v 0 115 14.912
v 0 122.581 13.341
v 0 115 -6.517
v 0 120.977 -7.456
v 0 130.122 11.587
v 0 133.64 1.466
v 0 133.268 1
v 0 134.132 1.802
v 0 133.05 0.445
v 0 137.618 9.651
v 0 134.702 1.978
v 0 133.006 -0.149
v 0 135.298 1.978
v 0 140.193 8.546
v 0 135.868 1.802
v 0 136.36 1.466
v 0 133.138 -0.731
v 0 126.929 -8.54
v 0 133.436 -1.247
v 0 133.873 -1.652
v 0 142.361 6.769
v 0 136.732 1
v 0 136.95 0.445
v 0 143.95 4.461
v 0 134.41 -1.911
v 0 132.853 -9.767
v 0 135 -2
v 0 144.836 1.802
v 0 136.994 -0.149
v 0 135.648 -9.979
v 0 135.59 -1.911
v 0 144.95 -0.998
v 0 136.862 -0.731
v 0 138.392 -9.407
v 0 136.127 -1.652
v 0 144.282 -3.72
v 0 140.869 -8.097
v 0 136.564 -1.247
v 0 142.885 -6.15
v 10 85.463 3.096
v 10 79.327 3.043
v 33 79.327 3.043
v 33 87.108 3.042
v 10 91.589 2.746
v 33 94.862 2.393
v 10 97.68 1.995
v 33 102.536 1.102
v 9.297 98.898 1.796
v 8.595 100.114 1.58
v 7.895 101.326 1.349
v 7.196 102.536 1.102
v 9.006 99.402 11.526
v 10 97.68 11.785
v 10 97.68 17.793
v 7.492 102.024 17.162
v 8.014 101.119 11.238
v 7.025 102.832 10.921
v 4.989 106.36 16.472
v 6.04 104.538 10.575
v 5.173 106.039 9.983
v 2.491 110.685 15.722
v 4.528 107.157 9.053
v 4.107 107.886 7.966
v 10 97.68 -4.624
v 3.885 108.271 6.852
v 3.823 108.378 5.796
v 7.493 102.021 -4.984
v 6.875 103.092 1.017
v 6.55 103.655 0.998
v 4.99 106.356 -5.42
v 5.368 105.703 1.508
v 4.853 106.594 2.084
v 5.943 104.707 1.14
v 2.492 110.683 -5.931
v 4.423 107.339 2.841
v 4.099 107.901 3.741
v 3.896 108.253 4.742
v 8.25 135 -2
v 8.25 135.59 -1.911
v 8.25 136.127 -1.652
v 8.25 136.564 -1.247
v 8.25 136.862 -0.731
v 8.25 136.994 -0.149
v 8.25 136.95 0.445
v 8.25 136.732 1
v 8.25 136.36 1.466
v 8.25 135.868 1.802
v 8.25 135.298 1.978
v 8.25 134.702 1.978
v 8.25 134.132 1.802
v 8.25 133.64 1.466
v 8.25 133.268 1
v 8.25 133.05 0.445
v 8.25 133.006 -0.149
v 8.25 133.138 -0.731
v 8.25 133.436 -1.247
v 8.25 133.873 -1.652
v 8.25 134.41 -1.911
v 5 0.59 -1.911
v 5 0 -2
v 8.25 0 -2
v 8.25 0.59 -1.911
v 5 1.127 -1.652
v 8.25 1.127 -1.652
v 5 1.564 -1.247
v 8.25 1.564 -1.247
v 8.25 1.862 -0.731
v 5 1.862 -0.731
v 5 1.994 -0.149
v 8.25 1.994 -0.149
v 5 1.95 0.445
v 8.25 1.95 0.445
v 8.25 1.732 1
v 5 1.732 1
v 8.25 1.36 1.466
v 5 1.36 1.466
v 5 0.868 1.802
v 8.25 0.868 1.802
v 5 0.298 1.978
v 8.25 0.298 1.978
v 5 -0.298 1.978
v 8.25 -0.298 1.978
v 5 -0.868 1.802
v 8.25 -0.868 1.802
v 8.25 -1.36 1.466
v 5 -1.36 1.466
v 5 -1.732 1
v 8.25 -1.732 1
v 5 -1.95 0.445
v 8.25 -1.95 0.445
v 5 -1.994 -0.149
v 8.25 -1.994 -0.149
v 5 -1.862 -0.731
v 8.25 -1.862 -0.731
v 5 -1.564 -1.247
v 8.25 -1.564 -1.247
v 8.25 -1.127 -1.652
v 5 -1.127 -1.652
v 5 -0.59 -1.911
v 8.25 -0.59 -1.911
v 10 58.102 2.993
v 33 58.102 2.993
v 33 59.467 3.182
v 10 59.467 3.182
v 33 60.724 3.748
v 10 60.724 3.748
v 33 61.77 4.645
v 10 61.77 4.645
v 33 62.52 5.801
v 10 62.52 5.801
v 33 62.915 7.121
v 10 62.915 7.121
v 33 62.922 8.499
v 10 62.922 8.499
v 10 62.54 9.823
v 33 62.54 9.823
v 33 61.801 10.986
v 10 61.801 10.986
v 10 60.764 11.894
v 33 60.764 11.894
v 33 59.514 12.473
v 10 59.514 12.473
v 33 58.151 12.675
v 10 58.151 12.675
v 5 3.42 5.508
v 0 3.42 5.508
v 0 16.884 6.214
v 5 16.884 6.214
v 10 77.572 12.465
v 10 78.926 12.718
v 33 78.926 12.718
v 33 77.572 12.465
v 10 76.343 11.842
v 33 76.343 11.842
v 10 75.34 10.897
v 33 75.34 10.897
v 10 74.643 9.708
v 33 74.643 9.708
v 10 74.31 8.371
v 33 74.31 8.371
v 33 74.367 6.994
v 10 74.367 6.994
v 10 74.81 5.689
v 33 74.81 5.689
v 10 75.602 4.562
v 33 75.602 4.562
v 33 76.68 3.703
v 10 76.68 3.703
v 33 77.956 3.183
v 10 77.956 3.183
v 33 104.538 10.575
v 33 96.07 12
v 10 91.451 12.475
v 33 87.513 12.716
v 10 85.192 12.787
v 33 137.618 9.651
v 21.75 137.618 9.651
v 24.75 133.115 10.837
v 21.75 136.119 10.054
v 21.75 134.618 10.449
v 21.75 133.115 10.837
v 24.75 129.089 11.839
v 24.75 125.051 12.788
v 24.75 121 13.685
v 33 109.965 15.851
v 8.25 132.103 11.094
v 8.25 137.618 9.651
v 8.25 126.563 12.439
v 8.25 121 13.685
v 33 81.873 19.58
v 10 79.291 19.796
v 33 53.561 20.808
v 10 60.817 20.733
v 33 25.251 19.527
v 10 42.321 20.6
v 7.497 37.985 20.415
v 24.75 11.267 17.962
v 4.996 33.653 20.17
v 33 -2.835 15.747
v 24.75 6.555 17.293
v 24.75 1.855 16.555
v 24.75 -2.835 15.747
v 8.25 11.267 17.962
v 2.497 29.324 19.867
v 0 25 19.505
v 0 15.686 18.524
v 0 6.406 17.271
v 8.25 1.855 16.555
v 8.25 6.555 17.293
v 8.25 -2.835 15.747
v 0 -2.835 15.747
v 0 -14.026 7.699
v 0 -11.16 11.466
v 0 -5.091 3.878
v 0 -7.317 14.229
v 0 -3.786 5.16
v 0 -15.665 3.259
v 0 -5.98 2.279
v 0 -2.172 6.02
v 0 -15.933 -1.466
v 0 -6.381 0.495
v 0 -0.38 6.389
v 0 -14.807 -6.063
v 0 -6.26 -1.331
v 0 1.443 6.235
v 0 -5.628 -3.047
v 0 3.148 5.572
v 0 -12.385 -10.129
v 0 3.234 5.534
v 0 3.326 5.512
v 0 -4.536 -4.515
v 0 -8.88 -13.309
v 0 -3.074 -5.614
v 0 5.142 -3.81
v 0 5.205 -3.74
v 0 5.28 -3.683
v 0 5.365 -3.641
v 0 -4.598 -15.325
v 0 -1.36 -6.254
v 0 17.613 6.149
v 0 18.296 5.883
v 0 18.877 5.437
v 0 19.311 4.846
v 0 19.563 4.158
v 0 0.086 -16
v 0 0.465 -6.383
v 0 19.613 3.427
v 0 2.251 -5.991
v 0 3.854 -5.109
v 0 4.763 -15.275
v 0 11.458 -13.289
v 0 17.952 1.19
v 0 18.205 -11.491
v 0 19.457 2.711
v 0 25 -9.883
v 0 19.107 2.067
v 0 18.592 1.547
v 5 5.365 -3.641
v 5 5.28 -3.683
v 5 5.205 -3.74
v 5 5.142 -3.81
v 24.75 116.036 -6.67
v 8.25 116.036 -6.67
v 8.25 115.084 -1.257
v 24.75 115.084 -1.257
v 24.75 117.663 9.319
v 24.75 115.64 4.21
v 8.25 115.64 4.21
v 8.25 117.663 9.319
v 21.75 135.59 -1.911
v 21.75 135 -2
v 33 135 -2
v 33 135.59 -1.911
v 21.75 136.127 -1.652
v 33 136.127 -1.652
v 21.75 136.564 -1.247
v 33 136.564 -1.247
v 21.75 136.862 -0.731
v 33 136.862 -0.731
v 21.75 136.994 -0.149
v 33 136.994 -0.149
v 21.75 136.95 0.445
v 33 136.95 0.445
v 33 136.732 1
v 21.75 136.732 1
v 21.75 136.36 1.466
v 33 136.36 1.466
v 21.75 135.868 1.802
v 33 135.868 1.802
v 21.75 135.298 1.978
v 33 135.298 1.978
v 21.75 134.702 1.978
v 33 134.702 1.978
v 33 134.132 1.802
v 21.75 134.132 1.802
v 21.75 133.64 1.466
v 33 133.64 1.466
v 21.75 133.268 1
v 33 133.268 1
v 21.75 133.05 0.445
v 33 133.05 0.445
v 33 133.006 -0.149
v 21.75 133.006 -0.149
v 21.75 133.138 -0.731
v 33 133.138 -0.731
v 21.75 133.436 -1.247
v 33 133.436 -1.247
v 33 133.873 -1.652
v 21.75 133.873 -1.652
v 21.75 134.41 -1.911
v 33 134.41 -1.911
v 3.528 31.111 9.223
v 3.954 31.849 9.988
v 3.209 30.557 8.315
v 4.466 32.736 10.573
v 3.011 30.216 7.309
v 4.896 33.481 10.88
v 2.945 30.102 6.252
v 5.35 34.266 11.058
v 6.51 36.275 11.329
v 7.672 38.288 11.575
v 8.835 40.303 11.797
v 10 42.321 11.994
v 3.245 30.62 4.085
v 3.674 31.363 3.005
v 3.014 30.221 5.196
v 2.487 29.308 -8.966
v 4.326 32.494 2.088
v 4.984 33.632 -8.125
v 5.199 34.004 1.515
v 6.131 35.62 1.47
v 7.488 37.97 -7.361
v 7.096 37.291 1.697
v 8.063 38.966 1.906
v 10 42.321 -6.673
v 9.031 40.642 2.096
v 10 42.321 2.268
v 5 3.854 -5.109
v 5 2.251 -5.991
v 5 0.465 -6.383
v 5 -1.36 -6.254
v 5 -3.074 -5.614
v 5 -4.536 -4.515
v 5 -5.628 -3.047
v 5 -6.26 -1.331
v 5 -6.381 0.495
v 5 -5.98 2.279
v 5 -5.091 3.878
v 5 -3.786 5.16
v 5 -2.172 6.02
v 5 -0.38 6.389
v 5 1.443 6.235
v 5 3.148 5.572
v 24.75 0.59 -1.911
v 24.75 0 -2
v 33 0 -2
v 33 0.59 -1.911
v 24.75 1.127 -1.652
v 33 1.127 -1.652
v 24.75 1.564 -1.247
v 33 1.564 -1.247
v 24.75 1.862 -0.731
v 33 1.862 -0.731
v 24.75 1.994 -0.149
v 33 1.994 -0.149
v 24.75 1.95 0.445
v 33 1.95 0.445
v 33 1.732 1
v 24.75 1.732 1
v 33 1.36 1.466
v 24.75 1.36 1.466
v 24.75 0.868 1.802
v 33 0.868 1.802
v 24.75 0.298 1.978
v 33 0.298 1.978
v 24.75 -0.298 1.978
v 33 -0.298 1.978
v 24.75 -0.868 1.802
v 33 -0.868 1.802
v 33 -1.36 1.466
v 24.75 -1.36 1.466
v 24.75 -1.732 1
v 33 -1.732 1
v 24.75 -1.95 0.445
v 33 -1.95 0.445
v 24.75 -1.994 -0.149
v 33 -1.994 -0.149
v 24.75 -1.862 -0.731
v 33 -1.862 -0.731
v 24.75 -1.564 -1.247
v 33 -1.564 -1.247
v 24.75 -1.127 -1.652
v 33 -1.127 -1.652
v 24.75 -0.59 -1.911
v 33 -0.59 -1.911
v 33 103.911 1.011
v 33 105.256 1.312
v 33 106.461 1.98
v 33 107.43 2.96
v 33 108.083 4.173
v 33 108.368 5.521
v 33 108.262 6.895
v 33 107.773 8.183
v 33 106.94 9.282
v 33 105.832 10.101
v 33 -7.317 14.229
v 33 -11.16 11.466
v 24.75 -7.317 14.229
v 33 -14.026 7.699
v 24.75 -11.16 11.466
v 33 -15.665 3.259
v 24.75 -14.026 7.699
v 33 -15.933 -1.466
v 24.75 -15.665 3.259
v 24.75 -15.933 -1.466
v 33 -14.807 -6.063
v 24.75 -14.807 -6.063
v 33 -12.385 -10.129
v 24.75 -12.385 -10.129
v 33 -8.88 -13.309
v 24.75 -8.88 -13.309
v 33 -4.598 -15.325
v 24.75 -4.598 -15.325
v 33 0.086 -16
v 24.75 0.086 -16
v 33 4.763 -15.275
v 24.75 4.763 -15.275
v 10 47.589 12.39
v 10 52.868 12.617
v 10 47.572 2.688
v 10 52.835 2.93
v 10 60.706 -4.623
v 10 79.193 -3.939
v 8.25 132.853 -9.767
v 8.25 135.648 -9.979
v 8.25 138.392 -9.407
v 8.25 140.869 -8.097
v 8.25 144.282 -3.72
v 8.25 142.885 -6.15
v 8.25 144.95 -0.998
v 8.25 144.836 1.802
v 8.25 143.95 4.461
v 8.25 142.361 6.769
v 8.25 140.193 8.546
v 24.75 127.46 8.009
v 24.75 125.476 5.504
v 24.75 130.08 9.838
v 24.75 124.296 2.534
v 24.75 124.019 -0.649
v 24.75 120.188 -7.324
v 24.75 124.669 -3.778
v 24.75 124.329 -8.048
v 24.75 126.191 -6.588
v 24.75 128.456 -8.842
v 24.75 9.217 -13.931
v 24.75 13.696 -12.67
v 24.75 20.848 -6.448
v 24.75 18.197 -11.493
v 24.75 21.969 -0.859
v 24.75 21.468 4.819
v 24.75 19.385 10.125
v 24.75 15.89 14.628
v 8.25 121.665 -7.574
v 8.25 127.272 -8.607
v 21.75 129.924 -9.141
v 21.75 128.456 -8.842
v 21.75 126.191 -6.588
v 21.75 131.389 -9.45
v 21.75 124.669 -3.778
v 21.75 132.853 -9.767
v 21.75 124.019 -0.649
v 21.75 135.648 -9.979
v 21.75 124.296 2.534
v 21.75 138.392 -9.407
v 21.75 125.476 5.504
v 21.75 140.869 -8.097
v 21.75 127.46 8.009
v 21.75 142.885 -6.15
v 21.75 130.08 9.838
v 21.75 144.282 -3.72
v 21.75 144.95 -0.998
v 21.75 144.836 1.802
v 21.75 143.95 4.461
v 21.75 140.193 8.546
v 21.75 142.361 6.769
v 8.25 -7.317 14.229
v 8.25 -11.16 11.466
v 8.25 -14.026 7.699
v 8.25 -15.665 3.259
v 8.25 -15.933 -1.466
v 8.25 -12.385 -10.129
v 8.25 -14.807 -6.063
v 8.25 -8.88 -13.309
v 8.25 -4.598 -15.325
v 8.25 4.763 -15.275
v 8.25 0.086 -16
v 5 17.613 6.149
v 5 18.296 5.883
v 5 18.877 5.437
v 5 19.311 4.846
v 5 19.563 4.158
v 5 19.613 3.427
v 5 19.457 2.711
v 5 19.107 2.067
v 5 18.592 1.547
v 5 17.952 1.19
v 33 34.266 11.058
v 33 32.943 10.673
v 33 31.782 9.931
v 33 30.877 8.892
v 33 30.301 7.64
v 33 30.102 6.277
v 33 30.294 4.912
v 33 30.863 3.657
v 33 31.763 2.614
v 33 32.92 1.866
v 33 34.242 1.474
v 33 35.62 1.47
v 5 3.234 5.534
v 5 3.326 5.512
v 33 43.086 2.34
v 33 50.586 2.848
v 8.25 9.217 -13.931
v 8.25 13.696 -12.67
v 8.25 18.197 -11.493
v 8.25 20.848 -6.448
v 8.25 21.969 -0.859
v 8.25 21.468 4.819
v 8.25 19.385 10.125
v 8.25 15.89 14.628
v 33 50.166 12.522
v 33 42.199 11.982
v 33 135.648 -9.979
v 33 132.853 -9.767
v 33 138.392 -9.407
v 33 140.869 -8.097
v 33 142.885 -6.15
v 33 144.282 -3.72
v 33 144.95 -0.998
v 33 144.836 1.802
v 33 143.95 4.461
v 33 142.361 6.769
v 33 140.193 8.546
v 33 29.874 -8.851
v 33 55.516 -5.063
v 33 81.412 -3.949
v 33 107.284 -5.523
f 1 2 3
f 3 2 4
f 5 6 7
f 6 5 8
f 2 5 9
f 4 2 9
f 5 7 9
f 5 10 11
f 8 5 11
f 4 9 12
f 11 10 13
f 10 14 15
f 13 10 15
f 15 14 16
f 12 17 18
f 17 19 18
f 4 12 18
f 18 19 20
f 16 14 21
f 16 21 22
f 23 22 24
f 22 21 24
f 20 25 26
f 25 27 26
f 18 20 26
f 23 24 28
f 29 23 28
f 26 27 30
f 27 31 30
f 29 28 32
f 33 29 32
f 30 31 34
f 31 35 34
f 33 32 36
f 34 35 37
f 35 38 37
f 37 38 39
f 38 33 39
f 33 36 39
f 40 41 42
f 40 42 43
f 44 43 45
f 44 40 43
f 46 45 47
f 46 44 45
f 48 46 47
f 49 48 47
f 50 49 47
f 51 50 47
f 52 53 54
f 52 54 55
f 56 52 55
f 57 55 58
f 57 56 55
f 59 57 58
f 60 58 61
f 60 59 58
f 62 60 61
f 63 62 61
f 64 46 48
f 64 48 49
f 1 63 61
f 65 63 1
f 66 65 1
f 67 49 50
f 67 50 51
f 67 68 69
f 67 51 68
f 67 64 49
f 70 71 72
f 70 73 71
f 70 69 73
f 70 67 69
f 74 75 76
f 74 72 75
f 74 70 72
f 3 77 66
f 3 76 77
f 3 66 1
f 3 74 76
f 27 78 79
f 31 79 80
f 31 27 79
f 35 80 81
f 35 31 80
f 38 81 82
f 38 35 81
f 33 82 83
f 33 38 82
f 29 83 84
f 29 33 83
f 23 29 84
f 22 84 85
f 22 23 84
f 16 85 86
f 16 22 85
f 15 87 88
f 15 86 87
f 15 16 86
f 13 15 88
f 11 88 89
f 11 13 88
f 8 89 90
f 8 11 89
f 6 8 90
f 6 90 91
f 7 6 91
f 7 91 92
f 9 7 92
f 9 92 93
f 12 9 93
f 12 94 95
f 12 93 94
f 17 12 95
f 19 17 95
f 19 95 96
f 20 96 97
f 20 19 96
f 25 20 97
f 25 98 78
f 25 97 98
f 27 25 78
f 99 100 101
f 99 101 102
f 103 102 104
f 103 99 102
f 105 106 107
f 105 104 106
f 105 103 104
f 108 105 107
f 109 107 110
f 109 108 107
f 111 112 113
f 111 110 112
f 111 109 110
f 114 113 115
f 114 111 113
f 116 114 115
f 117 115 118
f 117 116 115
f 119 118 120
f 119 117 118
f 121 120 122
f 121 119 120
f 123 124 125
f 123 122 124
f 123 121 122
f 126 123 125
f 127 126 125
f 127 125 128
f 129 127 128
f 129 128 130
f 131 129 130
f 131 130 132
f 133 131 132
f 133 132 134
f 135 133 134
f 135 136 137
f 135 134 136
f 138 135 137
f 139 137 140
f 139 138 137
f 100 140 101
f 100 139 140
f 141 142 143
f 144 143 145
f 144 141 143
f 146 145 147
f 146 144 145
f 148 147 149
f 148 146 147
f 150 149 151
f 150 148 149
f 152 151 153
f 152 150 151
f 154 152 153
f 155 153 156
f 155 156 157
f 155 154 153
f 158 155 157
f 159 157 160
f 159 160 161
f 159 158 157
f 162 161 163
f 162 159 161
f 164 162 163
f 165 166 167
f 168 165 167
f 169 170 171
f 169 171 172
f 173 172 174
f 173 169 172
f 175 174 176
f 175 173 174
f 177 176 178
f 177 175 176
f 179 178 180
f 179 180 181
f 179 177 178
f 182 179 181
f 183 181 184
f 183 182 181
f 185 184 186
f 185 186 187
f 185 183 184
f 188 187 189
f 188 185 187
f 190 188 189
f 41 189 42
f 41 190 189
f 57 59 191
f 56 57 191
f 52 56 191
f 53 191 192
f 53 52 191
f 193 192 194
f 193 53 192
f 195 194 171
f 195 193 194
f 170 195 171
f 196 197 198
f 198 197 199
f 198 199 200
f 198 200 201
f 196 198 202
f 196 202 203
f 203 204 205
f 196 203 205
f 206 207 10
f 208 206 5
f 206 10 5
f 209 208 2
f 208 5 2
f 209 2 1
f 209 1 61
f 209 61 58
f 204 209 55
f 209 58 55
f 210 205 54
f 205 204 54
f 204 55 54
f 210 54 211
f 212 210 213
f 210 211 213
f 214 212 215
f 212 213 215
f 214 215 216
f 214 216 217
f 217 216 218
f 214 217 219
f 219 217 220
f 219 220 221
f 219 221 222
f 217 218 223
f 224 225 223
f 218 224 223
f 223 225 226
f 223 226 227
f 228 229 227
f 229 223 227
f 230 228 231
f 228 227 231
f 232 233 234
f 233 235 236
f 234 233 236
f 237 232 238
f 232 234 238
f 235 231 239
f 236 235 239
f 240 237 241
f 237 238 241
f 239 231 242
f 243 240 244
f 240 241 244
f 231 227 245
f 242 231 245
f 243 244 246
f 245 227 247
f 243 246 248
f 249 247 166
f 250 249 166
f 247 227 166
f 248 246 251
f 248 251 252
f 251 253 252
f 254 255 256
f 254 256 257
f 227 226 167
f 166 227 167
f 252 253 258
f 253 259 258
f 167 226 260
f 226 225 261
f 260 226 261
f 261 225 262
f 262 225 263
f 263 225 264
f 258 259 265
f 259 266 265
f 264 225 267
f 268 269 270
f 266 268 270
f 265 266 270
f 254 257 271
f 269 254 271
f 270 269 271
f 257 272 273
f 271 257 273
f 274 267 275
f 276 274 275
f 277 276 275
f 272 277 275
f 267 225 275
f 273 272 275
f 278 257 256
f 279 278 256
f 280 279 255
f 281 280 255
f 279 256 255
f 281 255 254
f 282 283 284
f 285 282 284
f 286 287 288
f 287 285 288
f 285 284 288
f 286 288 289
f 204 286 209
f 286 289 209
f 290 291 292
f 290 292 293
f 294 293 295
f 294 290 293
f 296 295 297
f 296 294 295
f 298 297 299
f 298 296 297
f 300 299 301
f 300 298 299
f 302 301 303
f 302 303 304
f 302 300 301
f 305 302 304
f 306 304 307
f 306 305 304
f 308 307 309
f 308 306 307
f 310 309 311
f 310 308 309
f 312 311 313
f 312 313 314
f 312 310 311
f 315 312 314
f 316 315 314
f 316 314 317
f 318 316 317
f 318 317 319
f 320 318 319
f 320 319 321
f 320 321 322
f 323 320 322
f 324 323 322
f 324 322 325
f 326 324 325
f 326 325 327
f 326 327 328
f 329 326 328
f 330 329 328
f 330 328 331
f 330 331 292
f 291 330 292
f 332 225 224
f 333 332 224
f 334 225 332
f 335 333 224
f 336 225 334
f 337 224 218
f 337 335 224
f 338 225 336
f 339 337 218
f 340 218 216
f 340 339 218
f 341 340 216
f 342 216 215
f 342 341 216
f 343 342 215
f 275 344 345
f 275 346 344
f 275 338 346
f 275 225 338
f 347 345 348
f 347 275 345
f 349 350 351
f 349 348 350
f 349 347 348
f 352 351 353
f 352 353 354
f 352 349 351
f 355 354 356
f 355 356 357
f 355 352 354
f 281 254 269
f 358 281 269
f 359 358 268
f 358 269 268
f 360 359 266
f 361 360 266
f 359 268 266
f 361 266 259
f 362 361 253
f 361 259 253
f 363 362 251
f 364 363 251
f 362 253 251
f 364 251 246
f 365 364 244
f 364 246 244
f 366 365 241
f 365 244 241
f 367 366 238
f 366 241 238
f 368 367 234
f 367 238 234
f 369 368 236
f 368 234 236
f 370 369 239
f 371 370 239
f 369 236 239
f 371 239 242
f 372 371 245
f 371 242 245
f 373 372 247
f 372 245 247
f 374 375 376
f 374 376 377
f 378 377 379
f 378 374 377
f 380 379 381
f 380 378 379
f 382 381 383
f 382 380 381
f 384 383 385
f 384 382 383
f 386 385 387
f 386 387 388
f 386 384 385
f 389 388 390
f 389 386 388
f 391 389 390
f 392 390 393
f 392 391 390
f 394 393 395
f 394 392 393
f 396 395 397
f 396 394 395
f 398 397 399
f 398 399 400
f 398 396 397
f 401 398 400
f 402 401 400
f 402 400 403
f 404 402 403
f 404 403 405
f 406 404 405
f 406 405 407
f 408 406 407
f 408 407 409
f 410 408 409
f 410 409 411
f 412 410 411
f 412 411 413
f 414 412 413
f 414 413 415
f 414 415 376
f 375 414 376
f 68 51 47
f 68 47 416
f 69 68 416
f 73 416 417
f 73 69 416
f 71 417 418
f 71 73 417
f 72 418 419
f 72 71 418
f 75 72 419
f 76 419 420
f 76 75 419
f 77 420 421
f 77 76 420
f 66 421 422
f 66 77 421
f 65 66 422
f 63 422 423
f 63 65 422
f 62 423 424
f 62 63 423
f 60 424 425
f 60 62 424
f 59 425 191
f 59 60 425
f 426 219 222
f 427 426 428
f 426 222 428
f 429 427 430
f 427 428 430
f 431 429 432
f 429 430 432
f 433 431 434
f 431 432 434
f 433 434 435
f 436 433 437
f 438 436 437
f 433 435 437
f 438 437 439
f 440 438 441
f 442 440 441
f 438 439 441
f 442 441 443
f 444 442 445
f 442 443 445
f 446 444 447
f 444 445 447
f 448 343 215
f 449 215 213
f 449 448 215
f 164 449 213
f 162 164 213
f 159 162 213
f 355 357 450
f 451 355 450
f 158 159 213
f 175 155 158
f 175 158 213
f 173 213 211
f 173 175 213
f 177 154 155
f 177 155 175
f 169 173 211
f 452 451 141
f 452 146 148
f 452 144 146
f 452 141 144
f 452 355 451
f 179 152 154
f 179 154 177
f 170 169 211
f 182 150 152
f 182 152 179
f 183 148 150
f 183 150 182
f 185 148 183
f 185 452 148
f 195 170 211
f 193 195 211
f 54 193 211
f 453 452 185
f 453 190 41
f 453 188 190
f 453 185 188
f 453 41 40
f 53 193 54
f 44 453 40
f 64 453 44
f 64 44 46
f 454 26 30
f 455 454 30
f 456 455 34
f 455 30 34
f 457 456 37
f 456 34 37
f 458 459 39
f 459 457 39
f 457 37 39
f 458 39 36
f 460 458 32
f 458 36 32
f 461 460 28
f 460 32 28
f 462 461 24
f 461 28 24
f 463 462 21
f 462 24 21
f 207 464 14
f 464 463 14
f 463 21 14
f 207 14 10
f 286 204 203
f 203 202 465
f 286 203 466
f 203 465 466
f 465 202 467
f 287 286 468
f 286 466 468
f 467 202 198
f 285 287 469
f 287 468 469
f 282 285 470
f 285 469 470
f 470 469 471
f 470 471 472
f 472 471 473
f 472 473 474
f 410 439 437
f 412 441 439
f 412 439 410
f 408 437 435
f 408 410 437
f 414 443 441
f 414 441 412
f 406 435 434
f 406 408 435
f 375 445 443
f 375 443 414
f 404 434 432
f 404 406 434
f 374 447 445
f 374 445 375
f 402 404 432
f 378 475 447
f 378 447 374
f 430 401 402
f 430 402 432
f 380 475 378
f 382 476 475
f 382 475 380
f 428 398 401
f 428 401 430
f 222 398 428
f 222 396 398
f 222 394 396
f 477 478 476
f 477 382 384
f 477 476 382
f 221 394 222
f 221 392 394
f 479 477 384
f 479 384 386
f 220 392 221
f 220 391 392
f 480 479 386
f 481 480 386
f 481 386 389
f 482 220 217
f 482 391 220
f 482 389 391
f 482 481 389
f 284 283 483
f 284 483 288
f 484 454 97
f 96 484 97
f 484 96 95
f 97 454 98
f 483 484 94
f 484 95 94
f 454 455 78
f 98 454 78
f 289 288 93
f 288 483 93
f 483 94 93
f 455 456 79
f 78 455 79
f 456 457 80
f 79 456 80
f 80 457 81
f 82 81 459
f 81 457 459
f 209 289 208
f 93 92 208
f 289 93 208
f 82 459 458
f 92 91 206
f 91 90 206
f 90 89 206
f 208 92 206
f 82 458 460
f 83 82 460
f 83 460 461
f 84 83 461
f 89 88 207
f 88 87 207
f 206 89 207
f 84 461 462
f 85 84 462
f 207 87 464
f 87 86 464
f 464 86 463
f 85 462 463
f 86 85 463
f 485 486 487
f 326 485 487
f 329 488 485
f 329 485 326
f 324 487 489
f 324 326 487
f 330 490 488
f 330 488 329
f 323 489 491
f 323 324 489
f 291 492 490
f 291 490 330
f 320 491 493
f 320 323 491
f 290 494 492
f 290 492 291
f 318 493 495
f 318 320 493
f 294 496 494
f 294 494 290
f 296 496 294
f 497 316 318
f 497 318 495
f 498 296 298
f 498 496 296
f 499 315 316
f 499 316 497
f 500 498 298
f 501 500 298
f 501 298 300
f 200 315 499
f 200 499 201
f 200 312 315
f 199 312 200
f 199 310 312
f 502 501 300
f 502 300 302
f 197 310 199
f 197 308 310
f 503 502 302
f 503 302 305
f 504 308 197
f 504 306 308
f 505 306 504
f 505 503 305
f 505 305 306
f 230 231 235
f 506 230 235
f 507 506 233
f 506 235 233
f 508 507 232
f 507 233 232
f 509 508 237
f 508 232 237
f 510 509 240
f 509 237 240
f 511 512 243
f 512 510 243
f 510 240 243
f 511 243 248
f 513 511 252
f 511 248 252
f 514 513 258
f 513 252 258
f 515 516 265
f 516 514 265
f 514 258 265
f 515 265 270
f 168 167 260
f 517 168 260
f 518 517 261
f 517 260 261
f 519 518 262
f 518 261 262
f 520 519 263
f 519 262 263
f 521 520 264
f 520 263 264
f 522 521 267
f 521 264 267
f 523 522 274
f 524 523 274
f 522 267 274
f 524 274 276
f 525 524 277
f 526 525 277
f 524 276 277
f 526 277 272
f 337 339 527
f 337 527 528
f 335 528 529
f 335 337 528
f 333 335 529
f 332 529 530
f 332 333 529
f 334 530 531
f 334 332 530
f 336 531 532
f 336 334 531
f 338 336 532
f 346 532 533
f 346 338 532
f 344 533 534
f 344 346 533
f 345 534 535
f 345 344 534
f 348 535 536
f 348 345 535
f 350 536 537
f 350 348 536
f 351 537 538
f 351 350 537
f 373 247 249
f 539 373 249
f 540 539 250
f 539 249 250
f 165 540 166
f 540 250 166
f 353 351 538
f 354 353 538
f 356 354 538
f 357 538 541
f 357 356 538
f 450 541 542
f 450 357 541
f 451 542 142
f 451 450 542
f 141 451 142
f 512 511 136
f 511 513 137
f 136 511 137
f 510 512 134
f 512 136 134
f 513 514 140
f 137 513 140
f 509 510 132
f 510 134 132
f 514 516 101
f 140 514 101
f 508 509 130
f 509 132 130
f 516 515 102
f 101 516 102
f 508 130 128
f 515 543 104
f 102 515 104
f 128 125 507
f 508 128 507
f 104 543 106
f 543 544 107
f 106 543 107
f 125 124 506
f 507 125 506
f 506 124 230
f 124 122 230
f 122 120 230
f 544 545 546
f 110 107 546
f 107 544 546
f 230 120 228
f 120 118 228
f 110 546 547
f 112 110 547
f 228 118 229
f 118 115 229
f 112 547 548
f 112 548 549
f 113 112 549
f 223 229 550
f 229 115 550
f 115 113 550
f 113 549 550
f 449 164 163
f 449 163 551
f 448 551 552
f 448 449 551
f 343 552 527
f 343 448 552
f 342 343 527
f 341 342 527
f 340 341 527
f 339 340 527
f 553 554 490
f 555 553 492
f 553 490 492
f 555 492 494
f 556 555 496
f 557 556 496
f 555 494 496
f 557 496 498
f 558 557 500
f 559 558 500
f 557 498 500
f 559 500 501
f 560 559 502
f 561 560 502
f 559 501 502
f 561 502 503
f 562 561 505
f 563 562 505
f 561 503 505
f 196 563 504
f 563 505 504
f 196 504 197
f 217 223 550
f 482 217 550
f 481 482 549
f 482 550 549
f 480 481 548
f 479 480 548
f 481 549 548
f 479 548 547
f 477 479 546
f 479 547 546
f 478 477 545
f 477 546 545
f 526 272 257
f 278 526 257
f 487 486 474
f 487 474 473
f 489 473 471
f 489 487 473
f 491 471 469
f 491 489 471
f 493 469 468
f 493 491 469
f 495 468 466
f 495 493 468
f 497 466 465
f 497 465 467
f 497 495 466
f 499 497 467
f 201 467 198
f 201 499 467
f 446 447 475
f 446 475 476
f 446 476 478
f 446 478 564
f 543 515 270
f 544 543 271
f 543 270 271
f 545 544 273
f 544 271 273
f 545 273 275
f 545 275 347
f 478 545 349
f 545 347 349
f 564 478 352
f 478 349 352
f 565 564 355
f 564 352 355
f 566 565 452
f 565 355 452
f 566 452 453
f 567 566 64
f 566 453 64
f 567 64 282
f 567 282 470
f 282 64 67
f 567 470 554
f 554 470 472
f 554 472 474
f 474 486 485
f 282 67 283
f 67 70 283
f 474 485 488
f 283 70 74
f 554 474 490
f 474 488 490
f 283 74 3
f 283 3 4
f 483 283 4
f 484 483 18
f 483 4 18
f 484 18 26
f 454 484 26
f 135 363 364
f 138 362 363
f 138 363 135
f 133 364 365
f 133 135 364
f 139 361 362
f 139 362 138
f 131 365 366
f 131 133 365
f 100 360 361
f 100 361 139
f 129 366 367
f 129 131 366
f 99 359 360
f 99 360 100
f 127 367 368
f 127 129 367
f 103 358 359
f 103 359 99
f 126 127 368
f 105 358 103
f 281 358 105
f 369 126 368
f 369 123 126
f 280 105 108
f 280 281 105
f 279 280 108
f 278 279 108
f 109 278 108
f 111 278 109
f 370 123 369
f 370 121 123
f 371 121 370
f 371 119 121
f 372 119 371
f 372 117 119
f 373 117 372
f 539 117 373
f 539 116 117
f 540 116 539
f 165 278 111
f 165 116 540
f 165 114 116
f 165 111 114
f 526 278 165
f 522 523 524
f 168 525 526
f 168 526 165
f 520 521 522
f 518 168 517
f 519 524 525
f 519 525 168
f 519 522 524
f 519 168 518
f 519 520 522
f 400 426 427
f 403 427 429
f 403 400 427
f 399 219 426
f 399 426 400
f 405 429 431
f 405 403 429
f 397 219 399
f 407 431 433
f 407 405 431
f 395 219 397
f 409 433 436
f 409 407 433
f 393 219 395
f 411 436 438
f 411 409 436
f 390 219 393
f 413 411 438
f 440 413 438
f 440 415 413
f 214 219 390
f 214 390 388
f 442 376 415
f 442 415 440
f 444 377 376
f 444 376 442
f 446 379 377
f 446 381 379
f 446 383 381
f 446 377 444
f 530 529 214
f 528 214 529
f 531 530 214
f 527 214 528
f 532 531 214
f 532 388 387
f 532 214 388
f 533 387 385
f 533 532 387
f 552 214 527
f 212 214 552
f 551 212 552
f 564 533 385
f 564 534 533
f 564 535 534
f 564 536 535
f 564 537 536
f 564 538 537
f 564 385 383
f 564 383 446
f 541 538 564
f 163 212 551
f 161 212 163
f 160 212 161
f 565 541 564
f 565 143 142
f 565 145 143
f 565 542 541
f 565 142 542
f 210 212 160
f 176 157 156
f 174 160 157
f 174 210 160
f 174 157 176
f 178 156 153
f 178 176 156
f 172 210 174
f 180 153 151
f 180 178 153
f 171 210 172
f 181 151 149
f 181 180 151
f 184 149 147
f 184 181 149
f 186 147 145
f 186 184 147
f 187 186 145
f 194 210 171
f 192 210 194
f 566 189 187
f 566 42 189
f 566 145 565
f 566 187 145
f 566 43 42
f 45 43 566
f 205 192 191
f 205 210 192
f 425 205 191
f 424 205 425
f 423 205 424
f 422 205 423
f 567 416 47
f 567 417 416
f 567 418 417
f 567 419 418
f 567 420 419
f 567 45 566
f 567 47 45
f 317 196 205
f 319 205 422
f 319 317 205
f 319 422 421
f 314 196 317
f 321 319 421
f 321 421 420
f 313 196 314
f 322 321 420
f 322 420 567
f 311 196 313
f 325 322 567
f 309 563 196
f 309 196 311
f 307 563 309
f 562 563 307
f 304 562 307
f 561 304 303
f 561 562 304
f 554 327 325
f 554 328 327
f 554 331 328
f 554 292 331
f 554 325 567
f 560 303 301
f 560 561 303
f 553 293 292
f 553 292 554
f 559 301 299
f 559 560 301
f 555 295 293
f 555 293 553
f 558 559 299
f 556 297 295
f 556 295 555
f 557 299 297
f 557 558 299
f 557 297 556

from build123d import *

# Parameters (mm, degrees)
SKETCH1_R               = 2
BOSS_EXTRUDE1_DEPTH     = 33
CUT_EXTRUDE1_DEPTH      = 13.5
CUT_EXTRUDE2_DEPTH      = 16.5
SKETCH4_R               = 2
CUT_EXTRUDE3_DEPTH      = 5
CUT_EXTRUDE4_DEPTH      = 3
CUT_EXTRUDE5_DEPTH      = 151.15655797
CUT_EXTRUDE5_DEPTH_BACK = 151.15655797


with BuildPart() as part:
    # Sketch1 → Boss-Extrude1 (new body)
    with BuildSketch(Plane(origin=(0, 0, 0), x_dir=(0, 0, -1), z_dir=(1, 0, 0))):
        with BuildLine():
            ThreePointArc((-15.746923292, -2.834502924), (3.806207647, -15.54068156), (15.274538651, 4.763241437))
            ThreePointArc((15.274538651, 4.763241437), (4.169990688, 68.449264041), (9.766892503, 132.853418803))
            ThreePointArc((9.766892503, 132.853418803), (2.382772527, 144.71197174), (-9.651340082, 137.617562724))
            ThreePointArc((-9.651340082, 137.617562724), (-20.507516508, 67.730411775), (-15.746923292, -2.834502924))
        make_face()
        with Locations((0, 135)):
            Circle(SKETCH1_R, mode=Mode.SUBTRACT)
        Circle(SKETCH1_R, mode=Mode.SUBTRACT)
        with BuildLine():
            ThreePointArc((-12.675406771, 58.150621112), (-12.300365948, 46.179147672), (-11.058070356, 34.266400985))
            ThreePointArc((-11.058070356, 34.266400985), (-5.587650283, 30.149080215), (-1.470329513, 35.619500288))
            ThreePointArc((-1.470329513, 35.619500288), (-2.639739364, 46.833323654), (-2.992776465, 58.102428263))
            ThreePointArc((-2.992776465, 58.102428263), (-7.809995194, 62.967839841), (-12.675406771, 58.150621112))
        make_face(mode=Mode.SUBTRACT)
        with BuildLine():
            ThreePointArc((-10.574940666, 104.538451831), (-12.44695641, 91.799336957), (-12.717862815, 78.926260385))
            ThreePointArc((-12.717862815, 78.926260385), (-7.68030208, 74.289364014), (-3.04340571, 79.326924749))
            ThreePointArc((-3.04340571, 79.326924749), (-2.79792055, 90.992020929), (-1.101570529, 102.535726074))
            ThreePointArc((-1.101570529, 102.535726074), (-4.836892719, 108.273774021), (-10.574940666, 104.538451831))
        make_face(mode=Mode.SUBTRACT)
    extrude(amount=BOSS_EXTRUDE1_DEPTH)

    # Sketch2 → Cut-Extrude1 (cut)
    with BuildSketch(Plane.ZY.offset(-8.25)):
        with BuildLine():
            ThreePointArc((9.651340082, 137.617562724), (-2.382772527, 144.71197174), (-9.766892503, 132.853418803))
            ThreePointArc((-9.766892503, 132.853418803), (-8.074404211, 124.471332441), (-6.669573364, 116.036266424))
            ThreePointArc((-6.669573364, 116.036266424), (4.209591857, 115.639688485), (13.684813674, 121.000069207))
            ThreePointArc((13.684813674, 121.000069207), (11.779096359, 129.335763119), (9.651340082, 137.617562724))
        make_face()
    extrude(amount=-CUT_EXTRUDE1_DEPTH, mode=Mode.SUBTRACT)

    # Sketch3 → Cut-Extrude2 (cut)
    with BuildSketch(Plane.ZY.offset(-8.25)):
        with BuildLine():
            ThreePointArc((15.746923292, -2.834502924), (16.932948663, 4.203707123), (17.961705011, 11.266618507))
            ThreePointArc((17.961705011, 11.266618507), (4.818924594, 21.467521501), (-11.493429399, 18.196710256))
            ThreePointArc((-11.493429399, 18.196710256), (-13.290230642, 11.453587146), (-15.274538651, 4.763241437))
            ThreePointArc((-15.274538651, 4.763241437), (-3.806207647, -15.54068156), (15.746923292, -2.834502924))
        make_face()
    extrude(amount=-CUT_EXTRUDE2_DEPTH, mode=Mode.SUBTRACT)

    # Sketch4 → Cut-Extrude3 (cut)
    with BuildSketch(Plane.ZY):
        with BuildLine():
            Line((5.508484382, 3.419742698), (6.214100211, 16.883694767))
            ThreePointArc((6.214100211, 16.883694767), (4.158233816, 19.562952015), (1.190354311, 17.951524922))
            Line((1.190354311, 17.951524922), (-3.641316221, 5.364592854))
            ThreePointArc((-3.641316221, 5.364592854), (-3.710000961, 5.241267271), (-3.810417562, 5.14205387))
            ThreePointArc((-3.810417562, 5.14205387), (-1.330634821, -6.260144645), (5.572451385, 3.147663508))
            ThreePointArc((5.572451385, 3.147663508), (5.521069981, 3.279142571), (5.508484382, 3.419742698))
        make_face()
        Circle(SKETCH4_R, mode=Mode.SUBTRACT)
    extrude(amount=-CUT_EXTRUDE3_DEPTH, mode=Mode.SUBTRACT)

    # Sketch6 → Cut-Extrude4 (cut)
    with BuildSketch(Plane.ZY.offset(-21.75)):
        with BuildLine():
            ThreePointArc((-6.669573364, 116.036266424), (-7.677372534, 122.259874843), (-8.841790135, 128.456090831))
            ThreePointArc((-8.841790135, 128.456090831), (2.534260756, 124.295910948), (10.837329247, 133.115246758))
            ThreePointArc((10.837329247, 133.115246758), (12.319974341, 127.07150219), (13.684813674, 121.000069207))
            ThreePointArc((13.684813674, 121.000069207), (4.209591857, 115.639688485), (-6.669573364, 116.036266424))
        make_face()
    extrude(amount=-CUT_EXTRUDE4_DEPTH, mode=Mode.SUBTRACT)

    # Sketch8 → Cut-Extrude5 (cut, two sides: drawn at the far end of the back side and taken through both)
    with BuildSketch(Plane.XY.offset(-CUT_EXTRUDE5_DEPTH_BACK)):
        Polygon((0, 115.000069207), (0, 25), (10, 42.320508076), (10, 97.679561131), align=None)
    extrude(amount=CUT_EXTRUDE5_DEPTH + CUT_EXTRUDE5_DEPTH_BACK, mode=Mode.SUBTRACT)


solid = part.part
